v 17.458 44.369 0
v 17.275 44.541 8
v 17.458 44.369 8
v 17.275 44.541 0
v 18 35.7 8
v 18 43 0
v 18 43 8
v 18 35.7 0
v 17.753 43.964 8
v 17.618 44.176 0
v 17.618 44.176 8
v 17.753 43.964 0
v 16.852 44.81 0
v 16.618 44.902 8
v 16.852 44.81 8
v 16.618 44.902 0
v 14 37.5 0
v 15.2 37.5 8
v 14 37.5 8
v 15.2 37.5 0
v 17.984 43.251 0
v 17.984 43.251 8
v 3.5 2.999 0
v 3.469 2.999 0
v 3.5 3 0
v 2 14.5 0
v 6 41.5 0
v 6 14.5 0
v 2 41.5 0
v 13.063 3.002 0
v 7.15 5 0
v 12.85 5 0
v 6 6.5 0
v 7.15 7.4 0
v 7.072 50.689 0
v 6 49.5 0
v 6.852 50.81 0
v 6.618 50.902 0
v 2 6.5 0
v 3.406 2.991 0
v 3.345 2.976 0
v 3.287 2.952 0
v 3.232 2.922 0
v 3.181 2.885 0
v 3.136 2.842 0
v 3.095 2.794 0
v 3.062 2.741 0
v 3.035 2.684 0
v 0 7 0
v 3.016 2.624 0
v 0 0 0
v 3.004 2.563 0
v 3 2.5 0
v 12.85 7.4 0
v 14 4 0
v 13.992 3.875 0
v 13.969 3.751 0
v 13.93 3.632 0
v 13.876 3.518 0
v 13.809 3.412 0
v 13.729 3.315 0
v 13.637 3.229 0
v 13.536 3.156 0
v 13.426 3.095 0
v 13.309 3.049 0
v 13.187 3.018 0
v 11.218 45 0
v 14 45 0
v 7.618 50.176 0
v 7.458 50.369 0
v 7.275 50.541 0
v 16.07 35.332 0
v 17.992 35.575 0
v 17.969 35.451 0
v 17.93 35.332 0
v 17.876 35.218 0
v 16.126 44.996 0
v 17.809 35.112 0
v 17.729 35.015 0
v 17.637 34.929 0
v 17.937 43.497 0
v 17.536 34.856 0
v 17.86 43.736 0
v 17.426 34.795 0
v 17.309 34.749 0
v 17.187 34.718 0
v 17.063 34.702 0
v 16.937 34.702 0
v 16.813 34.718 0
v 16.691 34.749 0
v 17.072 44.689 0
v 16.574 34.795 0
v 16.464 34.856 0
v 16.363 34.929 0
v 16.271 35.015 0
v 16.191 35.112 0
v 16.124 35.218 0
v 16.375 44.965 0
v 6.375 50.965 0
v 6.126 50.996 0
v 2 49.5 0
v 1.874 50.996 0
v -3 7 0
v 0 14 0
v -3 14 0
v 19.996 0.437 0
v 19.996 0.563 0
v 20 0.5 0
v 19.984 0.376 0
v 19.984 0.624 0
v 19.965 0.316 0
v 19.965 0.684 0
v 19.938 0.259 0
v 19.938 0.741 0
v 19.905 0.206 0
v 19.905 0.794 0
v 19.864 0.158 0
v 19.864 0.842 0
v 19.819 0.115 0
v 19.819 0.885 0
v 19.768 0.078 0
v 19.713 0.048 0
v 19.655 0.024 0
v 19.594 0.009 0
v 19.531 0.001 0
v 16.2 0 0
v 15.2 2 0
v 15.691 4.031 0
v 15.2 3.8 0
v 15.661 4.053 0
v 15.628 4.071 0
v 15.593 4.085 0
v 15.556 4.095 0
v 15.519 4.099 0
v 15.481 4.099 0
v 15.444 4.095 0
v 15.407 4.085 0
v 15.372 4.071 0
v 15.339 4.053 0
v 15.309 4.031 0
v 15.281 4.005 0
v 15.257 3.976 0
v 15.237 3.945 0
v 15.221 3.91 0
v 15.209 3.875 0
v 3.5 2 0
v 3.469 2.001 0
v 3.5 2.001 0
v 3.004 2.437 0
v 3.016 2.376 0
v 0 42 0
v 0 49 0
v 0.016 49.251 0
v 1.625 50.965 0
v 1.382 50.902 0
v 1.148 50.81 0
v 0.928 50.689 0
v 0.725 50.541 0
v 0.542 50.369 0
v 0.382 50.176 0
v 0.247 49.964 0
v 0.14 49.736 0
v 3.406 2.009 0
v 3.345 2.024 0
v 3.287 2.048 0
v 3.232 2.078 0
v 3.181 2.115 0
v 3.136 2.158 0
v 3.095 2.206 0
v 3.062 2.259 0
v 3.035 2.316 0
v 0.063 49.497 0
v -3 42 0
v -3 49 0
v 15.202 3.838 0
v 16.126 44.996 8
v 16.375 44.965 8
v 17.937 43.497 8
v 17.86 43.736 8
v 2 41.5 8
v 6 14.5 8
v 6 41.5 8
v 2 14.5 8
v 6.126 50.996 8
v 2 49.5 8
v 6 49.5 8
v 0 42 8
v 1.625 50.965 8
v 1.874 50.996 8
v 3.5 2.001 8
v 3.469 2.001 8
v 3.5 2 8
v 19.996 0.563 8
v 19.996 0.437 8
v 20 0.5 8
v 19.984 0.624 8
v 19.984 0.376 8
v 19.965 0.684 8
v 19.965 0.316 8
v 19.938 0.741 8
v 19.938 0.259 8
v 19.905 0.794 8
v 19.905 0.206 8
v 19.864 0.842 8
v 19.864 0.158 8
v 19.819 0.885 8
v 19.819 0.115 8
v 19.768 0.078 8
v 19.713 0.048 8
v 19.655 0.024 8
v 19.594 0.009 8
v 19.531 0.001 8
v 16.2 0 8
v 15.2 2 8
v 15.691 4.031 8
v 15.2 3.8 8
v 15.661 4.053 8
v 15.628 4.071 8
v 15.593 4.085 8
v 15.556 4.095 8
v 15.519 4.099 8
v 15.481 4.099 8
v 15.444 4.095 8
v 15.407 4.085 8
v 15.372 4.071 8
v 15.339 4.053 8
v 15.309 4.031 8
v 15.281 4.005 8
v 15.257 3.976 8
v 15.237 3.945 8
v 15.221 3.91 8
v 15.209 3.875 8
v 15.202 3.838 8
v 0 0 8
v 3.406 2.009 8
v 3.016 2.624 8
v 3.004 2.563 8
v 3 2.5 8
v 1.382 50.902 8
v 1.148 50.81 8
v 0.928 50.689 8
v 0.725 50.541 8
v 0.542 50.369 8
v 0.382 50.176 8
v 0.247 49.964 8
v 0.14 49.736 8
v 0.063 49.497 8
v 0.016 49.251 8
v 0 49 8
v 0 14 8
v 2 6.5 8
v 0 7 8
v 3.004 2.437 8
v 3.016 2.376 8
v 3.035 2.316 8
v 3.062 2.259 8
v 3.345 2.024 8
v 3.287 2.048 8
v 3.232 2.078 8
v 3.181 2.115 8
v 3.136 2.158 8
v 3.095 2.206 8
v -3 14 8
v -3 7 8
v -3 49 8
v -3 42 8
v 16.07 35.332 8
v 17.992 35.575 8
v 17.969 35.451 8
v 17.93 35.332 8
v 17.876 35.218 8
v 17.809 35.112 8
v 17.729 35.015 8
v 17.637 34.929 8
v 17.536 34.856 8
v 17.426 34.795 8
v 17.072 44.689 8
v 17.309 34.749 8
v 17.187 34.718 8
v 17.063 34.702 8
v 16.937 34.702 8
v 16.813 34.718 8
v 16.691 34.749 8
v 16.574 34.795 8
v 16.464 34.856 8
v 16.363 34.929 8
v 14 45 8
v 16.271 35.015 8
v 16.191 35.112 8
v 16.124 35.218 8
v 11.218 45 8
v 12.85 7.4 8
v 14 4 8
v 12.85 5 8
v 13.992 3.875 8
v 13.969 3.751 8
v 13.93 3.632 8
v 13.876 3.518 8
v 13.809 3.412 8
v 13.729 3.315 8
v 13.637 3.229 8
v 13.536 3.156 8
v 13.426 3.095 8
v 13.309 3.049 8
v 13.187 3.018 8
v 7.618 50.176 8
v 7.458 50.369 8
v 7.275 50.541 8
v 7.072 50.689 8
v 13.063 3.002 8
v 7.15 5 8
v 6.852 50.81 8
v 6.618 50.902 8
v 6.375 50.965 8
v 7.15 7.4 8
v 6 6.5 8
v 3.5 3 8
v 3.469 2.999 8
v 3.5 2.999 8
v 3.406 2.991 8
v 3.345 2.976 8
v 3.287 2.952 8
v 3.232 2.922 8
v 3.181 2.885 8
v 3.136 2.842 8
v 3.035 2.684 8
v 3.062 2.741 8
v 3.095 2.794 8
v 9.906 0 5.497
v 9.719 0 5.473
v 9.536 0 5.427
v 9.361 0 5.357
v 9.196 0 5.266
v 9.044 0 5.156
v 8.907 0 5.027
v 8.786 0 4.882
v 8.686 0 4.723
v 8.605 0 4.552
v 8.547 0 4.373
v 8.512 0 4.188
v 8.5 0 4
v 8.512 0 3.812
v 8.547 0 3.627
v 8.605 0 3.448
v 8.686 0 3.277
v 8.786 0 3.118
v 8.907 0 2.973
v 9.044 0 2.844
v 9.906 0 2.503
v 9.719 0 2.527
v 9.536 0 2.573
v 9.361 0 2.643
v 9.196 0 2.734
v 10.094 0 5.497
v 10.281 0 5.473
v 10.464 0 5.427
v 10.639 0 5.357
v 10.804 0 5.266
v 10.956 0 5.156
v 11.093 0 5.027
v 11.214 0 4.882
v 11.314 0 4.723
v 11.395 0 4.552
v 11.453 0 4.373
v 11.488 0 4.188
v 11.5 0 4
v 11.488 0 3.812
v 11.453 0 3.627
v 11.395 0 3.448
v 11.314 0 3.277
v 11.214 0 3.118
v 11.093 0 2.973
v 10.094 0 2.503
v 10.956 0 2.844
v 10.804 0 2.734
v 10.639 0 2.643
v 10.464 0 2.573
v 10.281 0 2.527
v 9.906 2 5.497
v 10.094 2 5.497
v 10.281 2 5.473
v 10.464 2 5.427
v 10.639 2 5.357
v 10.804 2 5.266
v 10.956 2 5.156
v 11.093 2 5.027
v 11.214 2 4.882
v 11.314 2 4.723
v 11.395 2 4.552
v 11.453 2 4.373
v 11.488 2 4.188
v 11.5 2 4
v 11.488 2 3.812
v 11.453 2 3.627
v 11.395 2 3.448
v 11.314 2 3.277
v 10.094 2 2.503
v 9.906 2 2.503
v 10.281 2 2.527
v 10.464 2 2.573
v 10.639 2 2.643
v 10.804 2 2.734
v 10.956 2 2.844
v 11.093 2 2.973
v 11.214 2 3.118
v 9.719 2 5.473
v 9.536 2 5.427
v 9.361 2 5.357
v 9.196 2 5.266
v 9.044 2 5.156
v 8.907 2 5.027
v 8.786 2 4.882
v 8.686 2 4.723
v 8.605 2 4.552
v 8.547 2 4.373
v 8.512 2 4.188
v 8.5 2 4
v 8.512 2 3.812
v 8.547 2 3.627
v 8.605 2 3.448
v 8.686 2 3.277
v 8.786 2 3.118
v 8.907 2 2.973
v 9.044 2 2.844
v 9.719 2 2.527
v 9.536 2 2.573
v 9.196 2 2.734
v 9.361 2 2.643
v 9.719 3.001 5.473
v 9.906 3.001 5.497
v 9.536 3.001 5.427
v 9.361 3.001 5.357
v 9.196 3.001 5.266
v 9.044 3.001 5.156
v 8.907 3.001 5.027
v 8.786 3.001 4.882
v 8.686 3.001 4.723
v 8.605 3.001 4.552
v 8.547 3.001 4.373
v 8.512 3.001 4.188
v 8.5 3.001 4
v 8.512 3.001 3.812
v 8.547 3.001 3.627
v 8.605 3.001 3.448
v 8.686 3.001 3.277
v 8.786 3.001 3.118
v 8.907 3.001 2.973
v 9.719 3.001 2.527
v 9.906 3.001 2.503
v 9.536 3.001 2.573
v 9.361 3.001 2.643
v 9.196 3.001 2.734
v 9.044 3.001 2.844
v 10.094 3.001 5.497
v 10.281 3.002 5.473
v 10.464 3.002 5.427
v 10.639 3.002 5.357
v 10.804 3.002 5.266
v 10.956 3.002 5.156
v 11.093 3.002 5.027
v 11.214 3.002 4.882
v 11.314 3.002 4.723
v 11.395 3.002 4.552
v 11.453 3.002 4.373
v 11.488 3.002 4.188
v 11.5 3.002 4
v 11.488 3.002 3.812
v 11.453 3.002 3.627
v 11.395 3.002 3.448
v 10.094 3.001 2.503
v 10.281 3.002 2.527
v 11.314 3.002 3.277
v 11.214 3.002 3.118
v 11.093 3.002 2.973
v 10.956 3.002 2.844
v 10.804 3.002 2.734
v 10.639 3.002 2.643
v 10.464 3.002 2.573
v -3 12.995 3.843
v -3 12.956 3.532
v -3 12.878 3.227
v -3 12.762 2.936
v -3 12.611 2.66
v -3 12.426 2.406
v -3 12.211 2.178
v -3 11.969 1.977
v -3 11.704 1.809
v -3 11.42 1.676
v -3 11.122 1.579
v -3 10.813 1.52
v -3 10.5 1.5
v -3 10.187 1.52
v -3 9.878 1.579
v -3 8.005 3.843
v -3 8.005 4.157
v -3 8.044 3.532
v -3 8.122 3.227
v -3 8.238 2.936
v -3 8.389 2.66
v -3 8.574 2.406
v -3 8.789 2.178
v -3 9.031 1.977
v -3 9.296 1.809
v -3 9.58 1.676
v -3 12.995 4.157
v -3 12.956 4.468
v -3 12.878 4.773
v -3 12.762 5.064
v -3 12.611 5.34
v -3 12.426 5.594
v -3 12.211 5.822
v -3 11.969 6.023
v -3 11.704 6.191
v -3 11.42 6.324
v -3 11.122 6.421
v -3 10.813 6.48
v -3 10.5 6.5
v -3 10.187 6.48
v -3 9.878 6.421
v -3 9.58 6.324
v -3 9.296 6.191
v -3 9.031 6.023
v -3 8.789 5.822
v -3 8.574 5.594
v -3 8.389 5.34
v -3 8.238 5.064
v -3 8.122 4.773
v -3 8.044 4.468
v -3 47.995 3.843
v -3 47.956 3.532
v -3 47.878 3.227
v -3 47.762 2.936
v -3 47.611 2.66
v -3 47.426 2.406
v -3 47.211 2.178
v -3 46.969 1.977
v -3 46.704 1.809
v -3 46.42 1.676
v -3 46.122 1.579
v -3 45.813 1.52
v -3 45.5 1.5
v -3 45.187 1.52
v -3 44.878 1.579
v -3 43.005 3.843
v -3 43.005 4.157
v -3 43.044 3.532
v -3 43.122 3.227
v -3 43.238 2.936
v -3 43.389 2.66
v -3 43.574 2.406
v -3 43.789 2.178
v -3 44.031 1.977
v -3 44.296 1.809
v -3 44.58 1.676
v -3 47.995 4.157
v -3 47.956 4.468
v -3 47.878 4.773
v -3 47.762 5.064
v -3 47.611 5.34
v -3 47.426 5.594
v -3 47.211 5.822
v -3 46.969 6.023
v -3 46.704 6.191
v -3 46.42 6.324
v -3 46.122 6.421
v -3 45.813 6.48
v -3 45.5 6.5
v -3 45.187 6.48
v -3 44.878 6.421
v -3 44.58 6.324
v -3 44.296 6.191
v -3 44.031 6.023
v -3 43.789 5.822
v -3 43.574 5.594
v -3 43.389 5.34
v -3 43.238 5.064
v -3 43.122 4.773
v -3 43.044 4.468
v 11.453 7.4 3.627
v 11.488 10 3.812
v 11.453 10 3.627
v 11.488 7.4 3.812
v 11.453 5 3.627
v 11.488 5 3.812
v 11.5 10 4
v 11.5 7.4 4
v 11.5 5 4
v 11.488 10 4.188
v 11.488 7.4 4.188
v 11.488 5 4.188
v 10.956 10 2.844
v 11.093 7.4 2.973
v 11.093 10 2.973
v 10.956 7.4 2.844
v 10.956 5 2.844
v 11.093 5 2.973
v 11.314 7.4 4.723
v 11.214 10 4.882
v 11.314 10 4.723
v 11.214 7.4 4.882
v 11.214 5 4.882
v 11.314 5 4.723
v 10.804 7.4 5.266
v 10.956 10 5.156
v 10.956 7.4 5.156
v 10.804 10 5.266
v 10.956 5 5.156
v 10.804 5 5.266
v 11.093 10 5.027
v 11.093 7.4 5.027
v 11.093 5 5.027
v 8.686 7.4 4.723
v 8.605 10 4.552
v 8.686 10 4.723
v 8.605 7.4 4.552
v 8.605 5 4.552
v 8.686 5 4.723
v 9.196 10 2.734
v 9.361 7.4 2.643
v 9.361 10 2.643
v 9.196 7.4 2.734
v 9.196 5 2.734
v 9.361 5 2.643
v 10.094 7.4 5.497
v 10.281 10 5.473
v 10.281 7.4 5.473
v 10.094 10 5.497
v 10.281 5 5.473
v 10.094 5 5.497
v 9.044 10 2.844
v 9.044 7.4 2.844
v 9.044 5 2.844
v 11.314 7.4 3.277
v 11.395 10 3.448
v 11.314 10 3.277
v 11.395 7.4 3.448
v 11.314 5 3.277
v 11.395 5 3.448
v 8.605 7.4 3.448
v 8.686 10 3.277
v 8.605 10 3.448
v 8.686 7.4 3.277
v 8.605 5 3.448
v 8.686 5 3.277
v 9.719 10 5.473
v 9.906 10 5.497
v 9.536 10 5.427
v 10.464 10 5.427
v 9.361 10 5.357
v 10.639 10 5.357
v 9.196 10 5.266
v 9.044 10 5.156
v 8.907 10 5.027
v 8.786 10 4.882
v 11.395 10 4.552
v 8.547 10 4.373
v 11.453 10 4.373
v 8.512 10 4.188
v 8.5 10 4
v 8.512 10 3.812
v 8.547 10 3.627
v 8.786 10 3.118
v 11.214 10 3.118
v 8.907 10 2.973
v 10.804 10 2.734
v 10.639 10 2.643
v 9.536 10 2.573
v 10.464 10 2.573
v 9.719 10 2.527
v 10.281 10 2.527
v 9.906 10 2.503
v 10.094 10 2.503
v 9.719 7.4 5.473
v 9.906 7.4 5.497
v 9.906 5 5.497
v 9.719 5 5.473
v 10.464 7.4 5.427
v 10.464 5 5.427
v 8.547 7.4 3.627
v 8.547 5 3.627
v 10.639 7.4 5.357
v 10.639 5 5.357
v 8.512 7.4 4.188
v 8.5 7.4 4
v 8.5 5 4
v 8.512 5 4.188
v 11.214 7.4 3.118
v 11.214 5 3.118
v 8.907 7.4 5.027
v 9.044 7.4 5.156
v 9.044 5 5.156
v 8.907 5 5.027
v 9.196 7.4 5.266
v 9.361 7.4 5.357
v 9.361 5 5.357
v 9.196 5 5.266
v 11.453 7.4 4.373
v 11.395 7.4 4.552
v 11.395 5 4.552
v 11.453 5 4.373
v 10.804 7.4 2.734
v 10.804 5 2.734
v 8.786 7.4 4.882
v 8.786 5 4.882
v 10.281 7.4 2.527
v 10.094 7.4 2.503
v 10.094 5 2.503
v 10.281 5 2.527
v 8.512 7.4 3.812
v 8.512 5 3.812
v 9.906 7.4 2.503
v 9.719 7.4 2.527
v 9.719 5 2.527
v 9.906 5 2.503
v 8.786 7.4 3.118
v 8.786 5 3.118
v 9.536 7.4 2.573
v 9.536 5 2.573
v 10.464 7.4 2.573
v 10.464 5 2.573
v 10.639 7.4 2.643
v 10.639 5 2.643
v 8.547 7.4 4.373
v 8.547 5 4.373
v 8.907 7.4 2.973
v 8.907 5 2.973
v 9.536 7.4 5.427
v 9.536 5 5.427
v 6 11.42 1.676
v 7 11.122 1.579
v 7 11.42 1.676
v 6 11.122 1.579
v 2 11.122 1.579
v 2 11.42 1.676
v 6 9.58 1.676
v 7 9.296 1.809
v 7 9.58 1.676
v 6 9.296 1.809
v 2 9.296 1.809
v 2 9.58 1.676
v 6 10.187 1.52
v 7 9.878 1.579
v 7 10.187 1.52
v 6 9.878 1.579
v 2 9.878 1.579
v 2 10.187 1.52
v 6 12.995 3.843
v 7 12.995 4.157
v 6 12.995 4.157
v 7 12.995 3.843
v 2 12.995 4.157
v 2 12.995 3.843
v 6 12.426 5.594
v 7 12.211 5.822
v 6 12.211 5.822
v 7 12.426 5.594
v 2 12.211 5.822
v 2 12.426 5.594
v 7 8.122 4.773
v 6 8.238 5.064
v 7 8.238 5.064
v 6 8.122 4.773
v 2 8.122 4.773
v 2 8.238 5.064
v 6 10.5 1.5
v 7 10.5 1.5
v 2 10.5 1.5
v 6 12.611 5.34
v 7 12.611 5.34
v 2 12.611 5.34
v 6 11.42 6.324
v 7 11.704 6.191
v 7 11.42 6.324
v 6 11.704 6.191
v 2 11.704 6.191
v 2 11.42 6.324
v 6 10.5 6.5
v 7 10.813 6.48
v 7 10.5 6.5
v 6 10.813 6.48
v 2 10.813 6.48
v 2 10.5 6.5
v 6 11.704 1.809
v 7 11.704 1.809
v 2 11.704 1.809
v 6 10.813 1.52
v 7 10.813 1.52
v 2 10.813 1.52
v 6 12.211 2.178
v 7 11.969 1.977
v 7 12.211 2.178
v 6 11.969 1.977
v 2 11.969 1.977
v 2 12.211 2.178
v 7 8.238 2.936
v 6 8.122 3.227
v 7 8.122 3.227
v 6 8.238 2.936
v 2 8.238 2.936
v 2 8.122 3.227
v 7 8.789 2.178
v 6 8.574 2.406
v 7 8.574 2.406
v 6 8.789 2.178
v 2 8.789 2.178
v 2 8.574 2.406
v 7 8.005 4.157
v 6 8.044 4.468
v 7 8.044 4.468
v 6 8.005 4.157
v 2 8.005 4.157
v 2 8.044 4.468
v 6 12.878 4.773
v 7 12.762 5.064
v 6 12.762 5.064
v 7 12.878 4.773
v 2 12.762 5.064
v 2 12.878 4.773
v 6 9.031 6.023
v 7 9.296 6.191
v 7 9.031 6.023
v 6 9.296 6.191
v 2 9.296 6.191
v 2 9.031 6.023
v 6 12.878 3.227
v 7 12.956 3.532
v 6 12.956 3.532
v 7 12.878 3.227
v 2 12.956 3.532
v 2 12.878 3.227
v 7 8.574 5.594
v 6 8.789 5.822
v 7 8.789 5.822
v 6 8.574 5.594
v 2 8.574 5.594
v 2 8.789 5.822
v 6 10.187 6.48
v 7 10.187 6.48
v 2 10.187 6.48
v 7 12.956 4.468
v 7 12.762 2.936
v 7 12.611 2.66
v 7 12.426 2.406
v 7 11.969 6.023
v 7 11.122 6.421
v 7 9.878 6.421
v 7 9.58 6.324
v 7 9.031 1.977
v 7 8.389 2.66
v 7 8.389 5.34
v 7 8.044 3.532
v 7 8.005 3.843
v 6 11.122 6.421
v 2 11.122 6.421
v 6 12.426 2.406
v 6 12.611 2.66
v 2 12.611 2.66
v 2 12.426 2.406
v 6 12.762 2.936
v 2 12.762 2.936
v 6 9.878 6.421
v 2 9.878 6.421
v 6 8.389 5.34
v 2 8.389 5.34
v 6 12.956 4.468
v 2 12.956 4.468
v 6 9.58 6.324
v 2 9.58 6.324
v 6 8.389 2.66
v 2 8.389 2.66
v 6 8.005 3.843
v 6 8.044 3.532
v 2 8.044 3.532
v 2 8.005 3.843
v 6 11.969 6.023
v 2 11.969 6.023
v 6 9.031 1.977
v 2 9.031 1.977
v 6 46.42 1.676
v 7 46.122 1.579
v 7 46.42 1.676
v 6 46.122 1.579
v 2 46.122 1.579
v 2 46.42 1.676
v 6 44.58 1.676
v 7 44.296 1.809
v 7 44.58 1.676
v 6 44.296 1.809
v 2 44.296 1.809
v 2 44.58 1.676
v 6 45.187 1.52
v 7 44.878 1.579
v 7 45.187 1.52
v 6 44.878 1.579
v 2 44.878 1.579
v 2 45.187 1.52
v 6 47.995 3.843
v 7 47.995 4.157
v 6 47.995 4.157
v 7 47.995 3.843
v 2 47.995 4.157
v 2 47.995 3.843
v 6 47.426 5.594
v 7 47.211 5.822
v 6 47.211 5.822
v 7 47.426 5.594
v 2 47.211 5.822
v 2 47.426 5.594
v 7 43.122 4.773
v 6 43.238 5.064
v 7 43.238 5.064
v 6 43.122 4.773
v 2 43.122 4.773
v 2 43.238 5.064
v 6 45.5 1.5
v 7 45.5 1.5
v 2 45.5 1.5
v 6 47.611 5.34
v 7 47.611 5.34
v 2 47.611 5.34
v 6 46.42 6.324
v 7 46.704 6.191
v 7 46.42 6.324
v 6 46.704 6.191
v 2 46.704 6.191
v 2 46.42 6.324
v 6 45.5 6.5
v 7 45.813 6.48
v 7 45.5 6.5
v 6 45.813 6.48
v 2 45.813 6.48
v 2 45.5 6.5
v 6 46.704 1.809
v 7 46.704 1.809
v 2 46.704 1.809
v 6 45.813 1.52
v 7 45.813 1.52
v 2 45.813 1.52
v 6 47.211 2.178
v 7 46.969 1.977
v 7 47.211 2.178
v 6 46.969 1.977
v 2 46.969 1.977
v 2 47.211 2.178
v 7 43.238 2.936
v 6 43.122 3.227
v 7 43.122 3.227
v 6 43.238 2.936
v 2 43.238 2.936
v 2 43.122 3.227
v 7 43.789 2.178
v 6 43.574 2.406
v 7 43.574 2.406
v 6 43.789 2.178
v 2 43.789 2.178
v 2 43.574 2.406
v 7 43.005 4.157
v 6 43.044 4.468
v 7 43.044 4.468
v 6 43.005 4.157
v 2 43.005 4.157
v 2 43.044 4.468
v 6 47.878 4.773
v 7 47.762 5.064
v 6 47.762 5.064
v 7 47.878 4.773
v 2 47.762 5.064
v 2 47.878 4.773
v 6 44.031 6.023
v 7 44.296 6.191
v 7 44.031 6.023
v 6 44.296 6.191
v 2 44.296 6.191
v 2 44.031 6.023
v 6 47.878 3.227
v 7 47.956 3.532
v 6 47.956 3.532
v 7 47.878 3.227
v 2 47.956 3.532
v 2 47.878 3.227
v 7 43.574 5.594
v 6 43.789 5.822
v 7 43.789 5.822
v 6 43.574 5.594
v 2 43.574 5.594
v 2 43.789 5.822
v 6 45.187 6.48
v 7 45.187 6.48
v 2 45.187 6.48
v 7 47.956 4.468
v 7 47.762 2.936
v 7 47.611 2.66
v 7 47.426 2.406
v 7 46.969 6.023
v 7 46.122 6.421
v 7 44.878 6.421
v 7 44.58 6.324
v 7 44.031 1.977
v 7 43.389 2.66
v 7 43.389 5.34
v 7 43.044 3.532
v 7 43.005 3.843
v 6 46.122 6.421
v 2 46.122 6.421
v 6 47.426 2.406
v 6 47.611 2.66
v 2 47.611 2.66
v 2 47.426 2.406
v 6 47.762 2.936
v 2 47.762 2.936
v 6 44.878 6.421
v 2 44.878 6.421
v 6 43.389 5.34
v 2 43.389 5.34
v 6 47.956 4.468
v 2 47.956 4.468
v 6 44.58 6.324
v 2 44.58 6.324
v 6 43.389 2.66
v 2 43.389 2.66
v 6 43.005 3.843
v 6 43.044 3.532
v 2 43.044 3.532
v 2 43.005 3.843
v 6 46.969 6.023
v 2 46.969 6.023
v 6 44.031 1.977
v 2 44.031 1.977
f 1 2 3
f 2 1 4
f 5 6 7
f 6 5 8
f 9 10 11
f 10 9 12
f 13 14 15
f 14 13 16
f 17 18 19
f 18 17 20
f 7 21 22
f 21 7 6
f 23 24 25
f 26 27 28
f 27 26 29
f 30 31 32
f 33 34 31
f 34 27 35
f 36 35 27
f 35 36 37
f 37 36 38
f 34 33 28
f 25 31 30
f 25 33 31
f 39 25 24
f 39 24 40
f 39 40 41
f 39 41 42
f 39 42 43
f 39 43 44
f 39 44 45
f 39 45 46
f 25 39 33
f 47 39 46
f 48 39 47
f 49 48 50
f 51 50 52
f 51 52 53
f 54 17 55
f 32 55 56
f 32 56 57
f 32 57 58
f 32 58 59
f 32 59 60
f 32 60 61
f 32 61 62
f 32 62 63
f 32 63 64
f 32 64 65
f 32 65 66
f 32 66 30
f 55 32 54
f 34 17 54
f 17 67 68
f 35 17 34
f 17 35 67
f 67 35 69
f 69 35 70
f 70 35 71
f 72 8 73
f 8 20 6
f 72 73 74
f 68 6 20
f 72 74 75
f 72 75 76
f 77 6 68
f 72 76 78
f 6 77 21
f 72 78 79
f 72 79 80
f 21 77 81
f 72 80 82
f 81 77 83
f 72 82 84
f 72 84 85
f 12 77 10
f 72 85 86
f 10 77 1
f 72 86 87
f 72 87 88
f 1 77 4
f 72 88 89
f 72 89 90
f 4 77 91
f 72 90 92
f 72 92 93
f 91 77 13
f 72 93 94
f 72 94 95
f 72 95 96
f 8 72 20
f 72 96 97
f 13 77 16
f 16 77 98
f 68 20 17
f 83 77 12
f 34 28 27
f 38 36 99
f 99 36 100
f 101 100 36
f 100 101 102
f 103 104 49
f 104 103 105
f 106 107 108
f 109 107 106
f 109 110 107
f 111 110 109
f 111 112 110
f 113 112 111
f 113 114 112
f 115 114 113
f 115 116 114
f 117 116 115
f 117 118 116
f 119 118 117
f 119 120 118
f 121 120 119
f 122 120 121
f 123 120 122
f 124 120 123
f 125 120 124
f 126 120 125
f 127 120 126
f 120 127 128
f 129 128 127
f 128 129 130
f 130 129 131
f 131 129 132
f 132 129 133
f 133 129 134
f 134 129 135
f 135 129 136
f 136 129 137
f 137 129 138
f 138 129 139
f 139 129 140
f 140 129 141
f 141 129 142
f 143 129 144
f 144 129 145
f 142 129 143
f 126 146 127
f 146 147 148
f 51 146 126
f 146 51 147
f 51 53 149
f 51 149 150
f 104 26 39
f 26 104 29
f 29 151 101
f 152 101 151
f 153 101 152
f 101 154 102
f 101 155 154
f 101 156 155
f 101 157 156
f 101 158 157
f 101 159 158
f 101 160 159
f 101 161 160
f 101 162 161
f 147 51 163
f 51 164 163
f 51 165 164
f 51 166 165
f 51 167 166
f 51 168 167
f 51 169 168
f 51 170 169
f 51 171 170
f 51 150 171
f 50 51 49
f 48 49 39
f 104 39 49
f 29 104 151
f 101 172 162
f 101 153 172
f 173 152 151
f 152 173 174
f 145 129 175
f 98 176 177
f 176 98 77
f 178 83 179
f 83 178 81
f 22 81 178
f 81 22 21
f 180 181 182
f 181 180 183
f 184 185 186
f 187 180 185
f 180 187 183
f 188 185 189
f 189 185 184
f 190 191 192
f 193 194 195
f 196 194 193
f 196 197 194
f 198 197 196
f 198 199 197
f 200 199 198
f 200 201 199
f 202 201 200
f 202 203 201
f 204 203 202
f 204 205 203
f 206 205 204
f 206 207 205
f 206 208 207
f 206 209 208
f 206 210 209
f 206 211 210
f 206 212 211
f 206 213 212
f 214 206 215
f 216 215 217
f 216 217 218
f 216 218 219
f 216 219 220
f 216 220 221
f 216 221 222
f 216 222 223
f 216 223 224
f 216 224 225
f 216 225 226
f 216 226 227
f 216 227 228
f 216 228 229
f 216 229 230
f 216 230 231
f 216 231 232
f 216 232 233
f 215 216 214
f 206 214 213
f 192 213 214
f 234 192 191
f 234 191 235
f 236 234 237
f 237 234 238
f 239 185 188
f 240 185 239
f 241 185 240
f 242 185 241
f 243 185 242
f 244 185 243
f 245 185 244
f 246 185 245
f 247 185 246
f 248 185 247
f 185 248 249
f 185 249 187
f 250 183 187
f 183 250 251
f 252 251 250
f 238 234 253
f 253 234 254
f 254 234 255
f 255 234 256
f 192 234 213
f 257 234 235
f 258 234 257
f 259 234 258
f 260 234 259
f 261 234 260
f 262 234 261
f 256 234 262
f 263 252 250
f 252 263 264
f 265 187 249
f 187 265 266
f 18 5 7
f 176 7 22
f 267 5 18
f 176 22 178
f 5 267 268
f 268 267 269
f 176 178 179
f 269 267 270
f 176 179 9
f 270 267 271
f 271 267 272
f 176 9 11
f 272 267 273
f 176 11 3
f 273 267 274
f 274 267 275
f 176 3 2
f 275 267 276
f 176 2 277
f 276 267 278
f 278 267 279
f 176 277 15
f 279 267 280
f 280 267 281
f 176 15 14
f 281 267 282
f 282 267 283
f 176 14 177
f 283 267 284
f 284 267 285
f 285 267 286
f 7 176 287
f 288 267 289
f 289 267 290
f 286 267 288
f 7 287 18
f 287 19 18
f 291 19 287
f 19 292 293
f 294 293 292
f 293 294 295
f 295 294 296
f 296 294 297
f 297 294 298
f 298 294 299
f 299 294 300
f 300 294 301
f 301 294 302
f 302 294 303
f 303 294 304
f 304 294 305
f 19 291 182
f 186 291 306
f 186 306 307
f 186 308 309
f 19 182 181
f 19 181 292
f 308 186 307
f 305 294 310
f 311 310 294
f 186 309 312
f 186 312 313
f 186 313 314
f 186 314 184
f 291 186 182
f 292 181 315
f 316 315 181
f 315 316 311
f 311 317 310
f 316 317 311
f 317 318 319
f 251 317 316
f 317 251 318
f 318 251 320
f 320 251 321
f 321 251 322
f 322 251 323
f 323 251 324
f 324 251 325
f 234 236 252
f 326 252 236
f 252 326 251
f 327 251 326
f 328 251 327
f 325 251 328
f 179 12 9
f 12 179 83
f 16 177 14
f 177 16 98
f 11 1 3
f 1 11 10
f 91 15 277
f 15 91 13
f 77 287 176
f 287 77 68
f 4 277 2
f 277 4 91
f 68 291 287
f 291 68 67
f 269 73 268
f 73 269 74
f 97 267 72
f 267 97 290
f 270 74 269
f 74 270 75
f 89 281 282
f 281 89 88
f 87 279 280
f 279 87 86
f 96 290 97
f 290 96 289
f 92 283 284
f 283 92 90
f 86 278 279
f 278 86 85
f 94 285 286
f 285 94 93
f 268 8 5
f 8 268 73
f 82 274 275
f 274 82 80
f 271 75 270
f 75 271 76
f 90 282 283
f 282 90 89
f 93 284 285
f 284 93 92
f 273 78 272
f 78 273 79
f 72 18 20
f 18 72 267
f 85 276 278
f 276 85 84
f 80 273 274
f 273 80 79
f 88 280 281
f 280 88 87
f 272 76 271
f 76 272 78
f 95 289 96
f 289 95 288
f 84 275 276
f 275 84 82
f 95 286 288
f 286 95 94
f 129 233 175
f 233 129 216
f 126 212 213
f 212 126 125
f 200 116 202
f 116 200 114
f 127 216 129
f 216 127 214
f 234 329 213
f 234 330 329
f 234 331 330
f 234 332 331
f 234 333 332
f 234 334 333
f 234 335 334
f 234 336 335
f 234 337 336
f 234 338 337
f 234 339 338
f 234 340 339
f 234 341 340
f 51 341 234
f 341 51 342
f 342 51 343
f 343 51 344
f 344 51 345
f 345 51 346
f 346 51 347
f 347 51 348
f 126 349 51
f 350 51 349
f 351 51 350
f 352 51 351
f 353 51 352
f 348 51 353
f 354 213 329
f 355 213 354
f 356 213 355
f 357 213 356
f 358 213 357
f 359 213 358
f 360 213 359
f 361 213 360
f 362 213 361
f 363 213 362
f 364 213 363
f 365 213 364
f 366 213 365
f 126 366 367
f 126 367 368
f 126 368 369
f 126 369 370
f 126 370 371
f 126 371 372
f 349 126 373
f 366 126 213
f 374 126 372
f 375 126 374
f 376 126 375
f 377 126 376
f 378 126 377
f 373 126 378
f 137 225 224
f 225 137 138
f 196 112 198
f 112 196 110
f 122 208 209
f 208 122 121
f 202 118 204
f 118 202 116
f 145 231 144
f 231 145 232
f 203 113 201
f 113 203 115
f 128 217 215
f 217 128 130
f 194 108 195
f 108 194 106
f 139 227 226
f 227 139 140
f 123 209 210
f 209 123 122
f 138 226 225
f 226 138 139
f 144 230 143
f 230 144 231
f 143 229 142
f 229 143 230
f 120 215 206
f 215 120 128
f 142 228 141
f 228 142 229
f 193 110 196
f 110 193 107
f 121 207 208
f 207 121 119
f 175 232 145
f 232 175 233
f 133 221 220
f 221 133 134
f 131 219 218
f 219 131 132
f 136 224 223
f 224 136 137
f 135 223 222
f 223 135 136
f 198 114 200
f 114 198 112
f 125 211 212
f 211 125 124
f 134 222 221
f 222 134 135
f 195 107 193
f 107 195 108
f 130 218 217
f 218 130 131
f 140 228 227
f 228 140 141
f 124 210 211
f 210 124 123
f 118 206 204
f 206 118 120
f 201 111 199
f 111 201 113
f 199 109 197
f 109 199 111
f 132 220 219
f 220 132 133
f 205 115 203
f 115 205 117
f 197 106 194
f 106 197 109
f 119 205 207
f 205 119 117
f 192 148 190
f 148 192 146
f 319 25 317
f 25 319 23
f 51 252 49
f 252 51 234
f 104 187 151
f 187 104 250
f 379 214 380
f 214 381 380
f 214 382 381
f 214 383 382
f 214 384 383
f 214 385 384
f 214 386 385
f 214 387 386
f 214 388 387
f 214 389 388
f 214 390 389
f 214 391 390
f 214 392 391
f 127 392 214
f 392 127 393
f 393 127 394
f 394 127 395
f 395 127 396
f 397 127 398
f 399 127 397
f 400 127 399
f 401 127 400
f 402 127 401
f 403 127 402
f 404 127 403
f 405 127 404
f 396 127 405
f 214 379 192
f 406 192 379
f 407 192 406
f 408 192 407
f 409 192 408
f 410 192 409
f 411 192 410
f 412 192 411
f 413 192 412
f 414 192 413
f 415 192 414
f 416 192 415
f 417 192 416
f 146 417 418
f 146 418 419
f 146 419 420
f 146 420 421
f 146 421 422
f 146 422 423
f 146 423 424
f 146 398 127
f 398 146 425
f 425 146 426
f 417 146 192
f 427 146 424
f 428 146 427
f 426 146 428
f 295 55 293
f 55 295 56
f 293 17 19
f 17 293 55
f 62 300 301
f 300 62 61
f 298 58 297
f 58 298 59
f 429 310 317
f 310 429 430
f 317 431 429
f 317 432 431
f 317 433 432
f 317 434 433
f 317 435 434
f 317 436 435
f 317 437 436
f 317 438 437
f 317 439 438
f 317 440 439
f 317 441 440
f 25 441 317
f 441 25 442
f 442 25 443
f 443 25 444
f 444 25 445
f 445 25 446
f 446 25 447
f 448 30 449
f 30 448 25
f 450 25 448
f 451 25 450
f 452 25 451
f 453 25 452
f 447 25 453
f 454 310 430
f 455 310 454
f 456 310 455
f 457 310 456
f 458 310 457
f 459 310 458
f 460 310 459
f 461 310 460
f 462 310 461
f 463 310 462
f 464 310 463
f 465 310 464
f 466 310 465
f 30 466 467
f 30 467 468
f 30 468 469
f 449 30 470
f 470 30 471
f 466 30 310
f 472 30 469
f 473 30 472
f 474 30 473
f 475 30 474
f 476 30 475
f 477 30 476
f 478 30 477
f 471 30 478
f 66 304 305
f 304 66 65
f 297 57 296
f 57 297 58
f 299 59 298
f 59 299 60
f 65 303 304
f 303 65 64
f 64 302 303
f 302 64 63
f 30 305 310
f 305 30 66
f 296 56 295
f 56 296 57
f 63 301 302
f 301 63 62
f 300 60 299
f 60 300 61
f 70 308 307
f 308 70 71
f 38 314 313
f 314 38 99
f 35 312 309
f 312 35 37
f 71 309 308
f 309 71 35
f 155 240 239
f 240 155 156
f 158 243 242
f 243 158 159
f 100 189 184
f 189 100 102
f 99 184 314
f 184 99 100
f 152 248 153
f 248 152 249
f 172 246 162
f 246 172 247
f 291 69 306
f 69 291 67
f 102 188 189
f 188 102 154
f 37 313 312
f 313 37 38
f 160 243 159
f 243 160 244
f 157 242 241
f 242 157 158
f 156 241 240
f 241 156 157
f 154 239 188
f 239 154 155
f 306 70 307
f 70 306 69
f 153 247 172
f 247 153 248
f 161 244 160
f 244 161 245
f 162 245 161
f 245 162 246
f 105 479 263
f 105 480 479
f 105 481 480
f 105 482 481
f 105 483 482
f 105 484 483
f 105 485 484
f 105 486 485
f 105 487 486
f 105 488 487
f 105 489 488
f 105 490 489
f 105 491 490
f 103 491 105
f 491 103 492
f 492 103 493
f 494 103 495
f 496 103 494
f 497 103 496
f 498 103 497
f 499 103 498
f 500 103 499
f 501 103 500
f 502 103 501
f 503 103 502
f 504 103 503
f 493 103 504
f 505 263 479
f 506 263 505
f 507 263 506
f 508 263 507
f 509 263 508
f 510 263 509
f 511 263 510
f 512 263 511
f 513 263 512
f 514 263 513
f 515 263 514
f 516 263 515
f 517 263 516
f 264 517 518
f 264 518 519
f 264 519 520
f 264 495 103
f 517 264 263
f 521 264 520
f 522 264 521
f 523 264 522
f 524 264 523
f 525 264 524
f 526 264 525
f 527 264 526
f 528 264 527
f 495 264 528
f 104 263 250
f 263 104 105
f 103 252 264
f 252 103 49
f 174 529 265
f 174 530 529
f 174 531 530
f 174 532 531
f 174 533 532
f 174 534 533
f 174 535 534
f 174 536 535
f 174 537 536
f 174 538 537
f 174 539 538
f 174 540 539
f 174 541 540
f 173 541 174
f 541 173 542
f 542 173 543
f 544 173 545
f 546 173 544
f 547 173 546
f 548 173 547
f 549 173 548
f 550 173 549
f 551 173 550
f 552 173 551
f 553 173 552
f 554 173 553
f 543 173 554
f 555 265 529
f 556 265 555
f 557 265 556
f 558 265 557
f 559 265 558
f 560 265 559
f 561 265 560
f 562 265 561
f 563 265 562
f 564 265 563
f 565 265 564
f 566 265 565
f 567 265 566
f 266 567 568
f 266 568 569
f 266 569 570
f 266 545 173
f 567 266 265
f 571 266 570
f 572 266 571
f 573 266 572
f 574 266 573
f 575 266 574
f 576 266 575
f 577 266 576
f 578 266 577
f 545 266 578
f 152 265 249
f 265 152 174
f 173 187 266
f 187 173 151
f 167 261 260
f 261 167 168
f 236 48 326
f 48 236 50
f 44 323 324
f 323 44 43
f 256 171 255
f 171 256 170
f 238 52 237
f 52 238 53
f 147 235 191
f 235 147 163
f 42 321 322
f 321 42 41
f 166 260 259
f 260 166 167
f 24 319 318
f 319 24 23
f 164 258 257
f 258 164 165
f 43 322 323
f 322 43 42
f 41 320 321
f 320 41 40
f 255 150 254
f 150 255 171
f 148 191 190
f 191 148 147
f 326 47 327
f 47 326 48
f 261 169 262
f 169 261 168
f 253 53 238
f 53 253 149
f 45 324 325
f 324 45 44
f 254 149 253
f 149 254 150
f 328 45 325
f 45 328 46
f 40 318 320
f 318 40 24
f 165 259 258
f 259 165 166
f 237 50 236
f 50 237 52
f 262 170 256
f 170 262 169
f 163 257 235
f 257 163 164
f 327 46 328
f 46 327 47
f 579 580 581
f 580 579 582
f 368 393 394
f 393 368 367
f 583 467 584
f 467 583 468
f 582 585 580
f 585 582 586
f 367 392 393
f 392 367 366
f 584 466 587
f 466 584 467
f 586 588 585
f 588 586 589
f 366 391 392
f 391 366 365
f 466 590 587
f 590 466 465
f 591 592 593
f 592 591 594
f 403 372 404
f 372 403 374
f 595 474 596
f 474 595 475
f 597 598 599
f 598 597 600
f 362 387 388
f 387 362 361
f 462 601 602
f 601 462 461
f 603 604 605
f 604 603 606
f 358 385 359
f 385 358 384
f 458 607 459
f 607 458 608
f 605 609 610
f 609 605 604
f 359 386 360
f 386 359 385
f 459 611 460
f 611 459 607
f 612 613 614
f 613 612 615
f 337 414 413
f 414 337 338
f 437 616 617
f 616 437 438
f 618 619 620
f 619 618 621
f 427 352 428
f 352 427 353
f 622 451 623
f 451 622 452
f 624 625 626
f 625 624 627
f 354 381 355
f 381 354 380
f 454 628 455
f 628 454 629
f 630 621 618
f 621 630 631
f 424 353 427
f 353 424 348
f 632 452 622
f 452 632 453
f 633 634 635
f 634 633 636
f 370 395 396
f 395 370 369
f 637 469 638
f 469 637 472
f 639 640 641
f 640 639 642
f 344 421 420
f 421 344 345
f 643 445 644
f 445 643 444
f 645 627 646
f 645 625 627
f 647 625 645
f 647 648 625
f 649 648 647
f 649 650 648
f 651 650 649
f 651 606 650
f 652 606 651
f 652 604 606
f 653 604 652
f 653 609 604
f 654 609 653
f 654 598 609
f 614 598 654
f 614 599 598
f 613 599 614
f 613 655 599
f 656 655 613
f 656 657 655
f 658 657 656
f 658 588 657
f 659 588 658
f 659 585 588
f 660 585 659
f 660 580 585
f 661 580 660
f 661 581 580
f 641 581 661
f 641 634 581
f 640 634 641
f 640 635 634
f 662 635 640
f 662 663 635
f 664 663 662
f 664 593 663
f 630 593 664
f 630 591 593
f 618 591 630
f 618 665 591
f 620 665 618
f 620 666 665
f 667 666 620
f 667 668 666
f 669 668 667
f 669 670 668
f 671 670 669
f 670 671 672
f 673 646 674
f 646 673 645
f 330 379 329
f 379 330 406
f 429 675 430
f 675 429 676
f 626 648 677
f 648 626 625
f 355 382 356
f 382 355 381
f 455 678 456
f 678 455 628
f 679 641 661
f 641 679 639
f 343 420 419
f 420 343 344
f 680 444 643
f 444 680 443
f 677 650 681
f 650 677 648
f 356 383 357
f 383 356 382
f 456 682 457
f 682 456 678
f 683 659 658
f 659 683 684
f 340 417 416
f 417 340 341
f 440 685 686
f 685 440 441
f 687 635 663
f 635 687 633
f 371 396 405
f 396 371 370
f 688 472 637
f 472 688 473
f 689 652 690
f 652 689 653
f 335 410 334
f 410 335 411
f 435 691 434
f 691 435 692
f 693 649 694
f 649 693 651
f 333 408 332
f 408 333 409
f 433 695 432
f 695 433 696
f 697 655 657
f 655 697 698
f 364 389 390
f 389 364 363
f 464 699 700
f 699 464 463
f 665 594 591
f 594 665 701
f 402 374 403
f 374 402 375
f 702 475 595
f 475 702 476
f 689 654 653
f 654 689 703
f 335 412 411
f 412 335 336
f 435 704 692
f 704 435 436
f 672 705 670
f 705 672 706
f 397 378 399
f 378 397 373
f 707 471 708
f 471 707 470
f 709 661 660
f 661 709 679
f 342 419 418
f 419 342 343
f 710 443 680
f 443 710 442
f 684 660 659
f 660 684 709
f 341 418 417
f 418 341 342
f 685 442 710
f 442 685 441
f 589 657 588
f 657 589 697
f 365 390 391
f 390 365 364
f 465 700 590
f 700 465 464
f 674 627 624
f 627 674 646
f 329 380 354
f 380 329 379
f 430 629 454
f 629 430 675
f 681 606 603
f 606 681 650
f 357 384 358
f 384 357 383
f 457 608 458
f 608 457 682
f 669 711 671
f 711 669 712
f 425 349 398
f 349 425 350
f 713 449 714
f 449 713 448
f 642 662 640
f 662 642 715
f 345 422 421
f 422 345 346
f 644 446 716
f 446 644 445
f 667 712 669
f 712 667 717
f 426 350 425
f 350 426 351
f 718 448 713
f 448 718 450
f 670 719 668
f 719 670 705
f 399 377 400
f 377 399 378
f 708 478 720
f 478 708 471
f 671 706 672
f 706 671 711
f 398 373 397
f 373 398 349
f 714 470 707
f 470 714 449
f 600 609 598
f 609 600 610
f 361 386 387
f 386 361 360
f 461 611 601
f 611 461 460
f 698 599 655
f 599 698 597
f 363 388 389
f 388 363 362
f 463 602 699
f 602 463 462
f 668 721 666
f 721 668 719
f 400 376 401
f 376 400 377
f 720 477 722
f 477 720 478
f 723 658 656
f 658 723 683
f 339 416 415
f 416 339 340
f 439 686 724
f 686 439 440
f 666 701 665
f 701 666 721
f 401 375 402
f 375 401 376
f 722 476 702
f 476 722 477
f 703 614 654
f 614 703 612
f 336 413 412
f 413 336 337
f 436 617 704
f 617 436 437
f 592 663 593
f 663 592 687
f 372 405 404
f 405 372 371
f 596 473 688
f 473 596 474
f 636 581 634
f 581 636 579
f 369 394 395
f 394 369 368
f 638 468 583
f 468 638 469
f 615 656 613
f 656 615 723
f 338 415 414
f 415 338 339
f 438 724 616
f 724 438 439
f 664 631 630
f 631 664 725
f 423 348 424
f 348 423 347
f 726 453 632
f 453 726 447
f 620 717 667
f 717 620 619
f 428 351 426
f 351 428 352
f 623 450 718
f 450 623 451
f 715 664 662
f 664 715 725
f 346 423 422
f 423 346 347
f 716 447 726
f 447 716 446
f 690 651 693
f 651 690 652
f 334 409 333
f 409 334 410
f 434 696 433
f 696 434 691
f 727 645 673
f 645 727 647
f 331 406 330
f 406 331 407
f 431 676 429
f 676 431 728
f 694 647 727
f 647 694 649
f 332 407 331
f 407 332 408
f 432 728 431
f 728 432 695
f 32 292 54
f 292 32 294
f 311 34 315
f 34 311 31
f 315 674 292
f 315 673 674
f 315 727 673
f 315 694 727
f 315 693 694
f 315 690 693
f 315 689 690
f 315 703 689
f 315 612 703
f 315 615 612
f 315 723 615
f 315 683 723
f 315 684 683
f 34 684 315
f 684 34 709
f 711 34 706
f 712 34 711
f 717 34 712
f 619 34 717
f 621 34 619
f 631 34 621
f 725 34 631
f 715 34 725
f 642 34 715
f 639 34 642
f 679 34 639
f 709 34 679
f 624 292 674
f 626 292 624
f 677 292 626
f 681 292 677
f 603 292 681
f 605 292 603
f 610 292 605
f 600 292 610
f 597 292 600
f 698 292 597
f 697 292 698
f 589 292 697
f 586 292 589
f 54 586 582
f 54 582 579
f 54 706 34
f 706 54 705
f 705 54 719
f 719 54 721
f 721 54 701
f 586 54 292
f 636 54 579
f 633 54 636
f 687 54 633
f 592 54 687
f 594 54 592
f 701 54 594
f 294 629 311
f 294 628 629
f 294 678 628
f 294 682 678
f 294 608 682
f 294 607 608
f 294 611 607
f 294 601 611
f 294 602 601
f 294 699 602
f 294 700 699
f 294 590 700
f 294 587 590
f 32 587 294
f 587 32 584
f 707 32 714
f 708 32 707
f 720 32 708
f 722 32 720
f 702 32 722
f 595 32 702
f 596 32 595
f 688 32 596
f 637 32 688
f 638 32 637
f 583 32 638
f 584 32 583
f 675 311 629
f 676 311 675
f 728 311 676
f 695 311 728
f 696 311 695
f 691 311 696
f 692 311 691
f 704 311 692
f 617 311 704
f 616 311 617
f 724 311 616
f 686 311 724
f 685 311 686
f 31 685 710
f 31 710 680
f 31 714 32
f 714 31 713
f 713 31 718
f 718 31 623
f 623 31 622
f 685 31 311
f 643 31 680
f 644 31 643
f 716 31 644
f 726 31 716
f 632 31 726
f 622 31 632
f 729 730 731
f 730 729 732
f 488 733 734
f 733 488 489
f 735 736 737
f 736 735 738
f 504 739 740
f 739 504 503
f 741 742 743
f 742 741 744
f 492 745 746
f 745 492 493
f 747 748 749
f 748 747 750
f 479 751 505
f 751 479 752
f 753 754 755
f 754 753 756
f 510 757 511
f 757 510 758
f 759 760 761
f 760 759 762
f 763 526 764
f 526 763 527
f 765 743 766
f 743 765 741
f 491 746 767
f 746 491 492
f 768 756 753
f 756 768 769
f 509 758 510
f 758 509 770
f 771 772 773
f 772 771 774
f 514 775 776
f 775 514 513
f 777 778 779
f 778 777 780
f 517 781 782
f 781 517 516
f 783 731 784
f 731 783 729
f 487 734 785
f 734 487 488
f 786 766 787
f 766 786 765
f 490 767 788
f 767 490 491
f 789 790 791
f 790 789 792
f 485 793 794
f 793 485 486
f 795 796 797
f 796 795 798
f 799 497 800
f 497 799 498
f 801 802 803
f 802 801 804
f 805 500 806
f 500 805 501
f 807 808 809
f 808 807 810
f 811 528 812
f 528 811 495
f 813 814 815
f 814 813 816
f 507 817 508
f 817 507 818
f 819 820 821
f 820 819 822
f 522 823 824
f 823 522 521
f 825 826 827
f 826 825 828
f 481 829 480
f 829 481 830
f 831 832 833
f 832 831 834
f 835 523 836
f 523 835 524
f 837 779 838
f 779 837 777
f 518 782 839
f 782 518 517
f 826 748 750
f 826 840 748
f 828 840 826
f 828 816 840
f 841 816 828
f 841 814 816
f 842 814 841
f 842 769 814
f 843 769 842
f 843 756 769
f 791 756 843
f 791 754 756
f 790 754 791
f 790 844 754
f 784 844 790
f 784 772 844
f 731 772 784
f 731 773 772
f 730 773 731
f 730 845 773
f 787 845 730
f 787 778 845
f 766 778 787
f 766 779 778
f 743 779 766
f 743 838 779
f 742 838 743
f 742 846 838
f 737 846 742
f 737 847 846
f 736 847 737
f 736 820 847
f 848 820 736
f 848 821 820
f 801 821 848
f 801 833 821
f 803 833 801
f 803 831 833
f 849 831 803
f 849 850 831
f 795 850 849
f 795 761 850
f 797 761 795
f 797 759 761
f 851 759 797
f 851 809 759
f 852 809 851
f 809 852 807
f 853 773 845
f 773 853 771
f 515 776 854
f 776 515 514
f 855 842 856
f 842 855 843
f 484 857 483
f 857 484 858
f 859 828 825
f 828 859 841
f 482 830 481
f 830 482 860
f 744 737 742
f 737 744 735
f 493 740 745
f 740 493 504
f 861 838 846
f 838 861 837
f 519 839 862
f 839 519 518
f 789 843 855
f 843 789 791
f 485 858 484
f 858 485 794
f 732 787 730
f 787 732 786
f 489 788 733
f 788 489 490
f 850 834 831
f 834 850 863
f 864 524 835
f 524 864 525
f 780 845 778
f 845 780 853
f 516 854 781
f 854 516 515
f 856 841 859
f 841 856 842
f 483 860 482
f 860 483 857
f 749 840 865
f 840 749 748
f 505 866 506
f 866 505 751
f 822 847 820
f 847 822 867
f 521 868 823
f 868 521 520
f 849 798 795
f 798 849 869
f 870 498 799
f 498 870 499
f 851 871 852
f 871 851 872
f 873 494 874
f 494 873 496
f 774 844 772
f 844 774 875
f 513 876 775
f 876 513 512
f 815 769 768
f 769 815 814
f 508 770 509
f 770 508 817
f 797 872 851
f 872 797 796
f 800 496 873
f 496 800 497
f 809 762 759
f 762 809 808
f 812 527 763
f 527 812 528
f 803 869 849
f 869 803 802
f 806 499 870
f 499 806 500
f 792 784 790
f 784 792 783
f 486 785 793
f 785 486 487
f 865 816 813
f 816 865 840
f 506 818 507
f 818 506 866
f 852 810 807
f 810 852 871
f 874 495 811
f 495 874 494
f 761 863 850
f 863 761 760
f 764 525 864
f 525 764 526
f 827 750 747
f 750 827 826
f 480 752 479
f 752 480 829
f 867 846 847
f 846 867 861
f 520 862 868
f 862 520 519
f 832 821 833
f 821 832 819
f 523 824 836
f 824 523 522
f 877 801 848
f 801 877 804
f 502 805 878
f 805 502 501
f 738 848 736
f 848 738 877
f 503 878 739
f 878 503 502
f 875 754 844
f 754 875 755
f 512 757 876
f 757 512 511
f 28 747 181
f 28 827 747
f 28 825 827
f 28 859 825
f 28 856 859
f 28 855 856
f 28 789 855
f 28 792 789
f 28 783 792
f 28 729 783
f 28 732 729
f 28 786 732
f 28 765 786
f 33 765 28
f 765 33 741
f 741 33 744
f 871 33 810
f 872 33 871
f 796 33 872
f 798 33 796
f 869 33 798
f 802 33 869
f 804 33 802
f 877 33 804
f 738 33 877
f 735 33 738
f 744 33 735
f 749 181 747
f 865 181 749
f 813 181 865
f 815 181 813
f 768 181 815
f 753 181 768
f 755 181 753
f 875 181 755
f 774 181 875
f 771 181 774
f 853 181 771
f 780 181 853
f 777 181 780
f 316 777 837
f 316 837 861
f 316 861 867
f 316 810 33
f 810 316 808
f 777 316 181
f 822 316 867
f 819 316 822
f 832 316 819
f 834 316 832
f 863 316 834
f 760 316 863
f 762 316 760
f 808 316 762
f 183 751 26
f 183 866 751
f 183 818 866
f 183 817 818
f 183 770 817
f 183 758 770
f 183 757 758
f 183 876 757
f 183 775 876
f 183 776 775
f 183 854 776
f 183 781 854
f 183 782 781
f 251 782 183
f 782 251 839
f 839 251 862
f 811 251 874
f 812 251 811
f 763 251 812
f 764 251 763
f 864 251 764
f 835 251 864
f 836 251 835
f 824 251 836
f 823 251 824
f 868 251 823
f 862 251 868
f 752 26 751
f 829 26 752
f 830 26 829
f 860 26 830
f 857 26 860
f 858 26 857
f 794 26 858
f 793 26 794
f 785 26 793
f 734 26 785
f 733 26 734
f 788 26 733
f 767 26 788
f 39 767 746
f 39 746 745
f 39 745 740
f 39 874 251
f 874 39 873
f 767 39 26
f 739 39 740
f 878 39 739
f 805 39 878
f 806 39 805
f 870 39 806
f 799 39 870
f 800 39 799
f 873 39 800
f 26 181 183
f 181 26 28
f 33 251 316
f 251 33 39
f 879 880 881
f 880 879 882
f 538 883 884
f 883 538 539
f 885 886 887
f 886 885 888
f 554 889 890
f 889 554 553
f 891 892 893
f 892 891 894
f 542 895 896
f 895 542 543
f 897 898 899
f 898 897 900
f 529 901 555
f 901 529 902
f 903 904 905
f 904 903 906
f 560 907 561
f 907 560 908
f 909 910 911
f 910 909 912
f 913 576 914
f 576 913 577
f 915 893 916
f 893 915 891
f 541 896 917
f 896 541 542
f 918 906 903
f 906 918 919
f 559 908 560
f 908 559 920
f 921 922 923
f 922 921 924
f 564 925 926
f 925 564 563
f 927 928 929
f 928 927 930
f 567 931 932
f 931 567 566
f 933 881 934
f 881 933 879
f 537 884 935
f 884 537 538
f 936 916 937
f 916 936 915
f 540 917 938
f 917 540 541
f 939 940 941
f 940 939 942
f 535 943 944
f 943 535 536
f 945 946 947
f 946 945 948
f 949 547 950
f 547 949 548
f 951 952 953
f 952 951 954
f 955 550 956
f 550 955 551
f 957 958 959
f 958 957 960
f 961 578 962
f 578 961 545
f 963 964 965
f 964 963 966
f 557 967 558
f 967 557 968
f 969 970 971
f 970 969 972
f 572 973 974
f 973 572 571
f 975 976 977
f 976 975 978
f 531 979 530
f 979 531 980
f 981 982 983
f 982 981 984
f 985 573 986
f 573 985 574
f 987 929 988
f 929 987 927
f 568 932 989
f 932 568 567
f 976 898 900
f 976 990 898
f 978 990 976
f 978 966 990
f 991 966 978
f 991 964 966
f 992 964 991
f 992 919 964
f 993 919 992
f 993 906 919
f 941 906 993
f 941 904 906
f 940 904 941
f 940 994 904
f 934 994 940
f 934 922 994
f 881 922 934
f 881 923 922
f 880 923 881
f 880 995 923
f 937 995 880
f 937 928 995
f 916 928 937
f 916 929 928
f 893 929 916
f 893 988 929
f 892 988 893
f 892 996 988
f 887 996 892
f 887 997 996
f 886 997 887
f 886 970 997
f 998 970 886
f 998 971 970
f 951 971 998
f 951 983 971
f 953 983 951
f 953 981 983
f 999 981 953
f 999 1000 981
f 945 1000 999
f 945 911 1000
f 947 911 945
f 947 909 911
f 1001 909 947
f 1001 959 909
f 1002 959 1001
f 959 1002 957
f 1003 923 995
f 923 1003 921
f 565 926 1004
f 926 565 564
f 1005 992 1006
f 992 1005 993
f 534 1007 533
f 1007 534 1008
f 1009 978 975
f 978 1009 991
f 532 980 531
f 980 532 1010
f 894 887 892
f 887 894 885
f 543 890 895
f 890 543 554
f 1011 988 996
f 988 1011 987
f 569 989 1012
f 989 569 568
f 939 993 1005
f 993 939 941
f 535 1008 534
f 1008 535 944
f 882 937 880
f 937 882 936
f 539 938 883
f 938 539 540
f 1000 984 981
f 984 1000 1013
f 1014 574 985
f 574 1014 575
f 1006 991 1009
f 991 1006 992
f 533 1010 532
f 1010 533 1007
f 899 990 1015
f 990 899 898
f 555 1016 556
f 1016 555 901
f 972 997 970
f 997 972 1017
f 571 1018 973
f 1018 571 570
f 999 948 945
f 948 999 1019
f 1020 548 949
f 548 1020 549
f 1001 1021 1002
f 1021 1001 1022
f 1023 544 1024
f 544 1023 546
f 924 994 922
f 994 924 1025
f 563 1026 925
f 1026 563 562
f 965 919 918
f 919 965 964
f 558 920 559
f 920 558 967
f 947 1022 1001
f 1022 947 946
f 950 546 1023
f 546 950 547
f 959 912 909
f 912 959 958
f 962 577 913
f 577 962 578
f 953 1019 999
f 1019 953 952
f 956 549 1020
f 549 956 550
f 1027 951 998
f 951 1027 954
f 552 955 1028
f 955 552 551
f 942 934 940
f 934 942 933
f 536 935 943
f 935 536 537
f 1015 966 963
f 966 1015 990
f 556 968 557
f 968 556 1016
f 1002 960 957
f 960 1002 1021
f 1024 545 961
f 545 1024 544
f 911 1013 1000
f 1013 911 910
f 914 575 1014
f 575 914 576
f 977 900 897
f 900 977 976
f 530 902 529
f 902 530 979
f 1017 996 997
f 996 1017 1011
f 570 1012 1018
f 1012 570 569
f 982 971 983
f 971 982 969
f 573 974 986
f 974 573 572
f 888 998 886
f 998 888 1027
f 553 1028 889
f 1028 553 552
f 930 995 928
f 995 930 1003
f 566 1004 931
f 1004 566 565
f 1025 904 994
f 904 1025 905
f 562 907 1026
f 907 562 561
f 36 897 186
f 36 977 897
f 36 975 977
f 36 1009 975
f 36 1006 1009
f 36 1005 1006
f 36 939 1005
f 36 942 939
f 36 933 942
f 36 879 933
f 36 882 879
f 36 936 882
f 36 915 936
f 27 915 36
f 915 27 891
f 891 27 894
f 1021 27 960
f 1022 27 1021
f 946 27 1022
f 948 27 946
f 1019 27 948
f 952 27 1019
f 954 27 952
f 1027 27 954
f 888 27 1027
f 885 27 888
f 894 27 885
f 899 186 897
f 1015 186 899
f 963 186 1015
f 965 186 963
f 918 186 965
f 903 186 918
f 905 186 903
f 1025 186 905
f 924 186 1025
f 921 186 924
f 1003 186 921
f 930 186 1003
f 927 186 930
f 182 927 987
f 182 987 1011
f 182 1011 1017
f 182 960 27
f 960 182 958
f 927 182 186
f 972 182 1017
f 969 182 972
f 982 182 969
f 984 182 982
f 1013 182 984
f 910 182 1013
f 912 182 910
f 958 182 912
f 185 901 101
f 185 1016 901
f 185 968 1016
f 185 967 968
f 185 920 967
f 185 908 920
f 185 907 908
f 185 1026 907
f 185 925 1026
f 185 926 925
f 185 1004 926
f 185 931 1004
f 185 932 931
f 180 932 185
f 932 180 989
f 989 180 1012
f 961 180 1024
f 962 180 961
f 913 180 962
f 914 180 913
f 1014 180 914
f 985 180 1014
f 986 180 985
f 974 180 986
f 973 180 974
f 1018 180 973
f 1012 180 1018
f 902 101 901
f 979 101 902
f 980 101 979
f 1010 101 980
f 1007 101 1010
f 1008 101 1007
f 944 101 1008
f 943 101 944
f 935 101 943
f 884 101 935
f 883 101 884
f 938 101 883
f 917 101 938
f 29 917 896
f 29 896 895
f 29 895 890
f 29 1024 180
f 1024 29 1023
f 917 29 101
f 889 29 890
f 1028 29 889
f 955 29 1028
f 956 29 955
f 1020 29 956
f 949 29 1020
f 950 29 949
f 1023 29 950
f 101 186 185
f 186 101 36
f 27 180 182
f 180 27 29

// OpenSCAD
//-------------------------------------------------------------------
// title: DIN clip
// author: OK1HRA 
// license: Creative Commons BY-SA
// URL: http://remoteqth.com/3d-din-rail-mount-clip.php
// Original revision: 0.1
// revision: 0.2b Contributed by John Cabrer
// format: OpenSCAD
//-------------------------------------------------------------------
// HowTo:
// Determine the center to center hole spacing of the device to mount (mount_hole_spacing)
// Pick a metric screw size, and length
// Pick a nut width and height
// See http://mcmaster-carr.com/ for drawings of all screws and nuts.
// The mount post length is calculated based on the screw length
// After after making your changes, press F5 to re-render them to the screen
// .STL export press F6 and menu /Design/Export as STL...

// ----- Inside Hole Calibration Values --------
// To use, print out a part with default values (i.e. mount_nut_width = 8,
// actual_measurement = 8)
// Measure the resulting hole width of the nut, and type that value as the actual measurement. Render and export. Print again.
// The gain_adjust value will insure that holes measure as they should.

expected_measurement = 8;
actual_measurement = 8;
gain_adjust = expected_measurement / actual_measurement; // Default = 8/8 = 1

//----------------- Mounting Srew Input Parameters ---------------------------------
plate_thickness = 1;    // This is the thickness of the thing being mounted
mount_hole_spacing = 35;    // mount_hole_spacing between mounting holes
mount_screw_length = 10; // Min = 6
mount_screw_thread_diameter = 5;    // Min = 1, Max = 6
mount_nut_width = 8;   // Max = 10
mount_nut_height = 4;   // Max = 5

//----------------- Mounting Srew Input Parameters, Default is M3x8 ---------------------------------
lock_screw_length = 8; 
lock_screw_thread_diameter = 3 * gain_adjust;
lock_nut_width = 5.5 * gain_adjust;
lock_nut_height = 2.4 * gain_adjust;

//----------------- Calculated Parameters
standoff_length = mount_screw_length - (mount_nut_height * gain_adjust) - plate_thickness - 2;
$fn=50;
width = 8; 
r_mount_screw = (mount_screw_thread_diameter * gain_adjust) / 2;      // Radius of the mounting screw threads
r_lock_screw = (lock_screw_thread_diameter * gain_adjust) / 2;
expand = 1;      // 0-x
long = 45;

din();

module din(){
	difference() {
		union() {
			hull() {
				translate([15+expand,long-2,0]) {
                    cylinder(h=width, r=2, center=false);}

                translate([12+expand,37.5,0]) {
                    cube([5,1,width], center=false);}

                translate([12+expand,long-1,0]) {
                    cube([1,1,width], center=false);}
            }

			hull() {
				translate([16+expand,35.7,0]) {
                    cylinder(h=width, r=1, center=false);}

                translate([14.2+expand,37.5,0]) {
                    cube([2.8,1,width], center=false);}
            }

			hull() {
				translate([18.5+expand,0.5,0]) {
                    cylinder(h=width, r=0.5, center=false);}
				translate([14.5+expand,3.8,0]) {
                    cylinder(h=width, r=0.3, center=false);}
				translate([14.2+expand,0,0]) {
                    cube([1,1,width], center=false);}
			}

			cube([3.5,4,width], center=false);
            cube([15+expand,2,width], center=false);

			hull() {
				translate([12+expand,4,0]) {
                    cylinder(h=width, r=1, center=false);}

                translate([0,3,0]) {
                    cube([1,1,width], center=false);}

                translate([0,long-1,0]) {
                    cube([13+expand,1,width], center=false);}
            }

			hull() {
            translate([0,40,0]) {
                cube([14,1,width], center=false);}

            translate([2,mount_hole_spacing+14,0]) {
                cylinder(h=width, r=2, center=false);}

            translate([6,mount_hole_spacing+14,0]) {
                cylinder(h=width, r=2, center=false);}
            }

            translate([-standoff_length,10.5-3.5,0]) {
                cube([standoff_length+1,7,width], center=false);}

            translate([-standoff_length,10.5-3.5+mount_hole_spacing,0]) {
                cube([standoff_length+1,7,width], center=false);}
        }
        // Clip fillet
        translate([3.5,2.5,-1]) {
            cylinder(h=width+2, r=0.5, center=false);}
        
        // Lock Screw and Nut
        translate([9+expand,-1,width/2]) rotate([-90,0,0]){
            cylinder(h=lock_screw_length+3, r=r_lock_screw, center=false);}

		translate([6.15+expand,5,-1]) {
            cube([5.7,lock_nut_height,width+2], center=false);}

        // 1. mount
        translate([-1-standoff_length,10.5,width/2]) rotate([0,90,0]){
            cylinder(h=standoff_length+8, r=r_mount_screw, center=false);}

		translate([2,7.65 - (((mount_nut_width * gain_adjust) - 5.7) / 2),-1]) {
            cube([mount_nut_height * gain_adjust,mount_nut_width * gain_adjust,width+2], center=false);}

        // 2. mount
        translate([-1-standoff_length,10.5+mount_hole_spacing,width/2]) rotate([0,90,0]){
            cylinder(h=standoff_length+8, r=r_mount_screw, center=false);}

		translate([2,7.65 - (((mount_nut_width * gain_adjust) - 5.7) / 2)+mount_hole_spacing,-1]) {
            cube([mount_nut_height * gain_adjust,mount_nut_width * gain_adjust,width+2], center=false);}
    }
}
